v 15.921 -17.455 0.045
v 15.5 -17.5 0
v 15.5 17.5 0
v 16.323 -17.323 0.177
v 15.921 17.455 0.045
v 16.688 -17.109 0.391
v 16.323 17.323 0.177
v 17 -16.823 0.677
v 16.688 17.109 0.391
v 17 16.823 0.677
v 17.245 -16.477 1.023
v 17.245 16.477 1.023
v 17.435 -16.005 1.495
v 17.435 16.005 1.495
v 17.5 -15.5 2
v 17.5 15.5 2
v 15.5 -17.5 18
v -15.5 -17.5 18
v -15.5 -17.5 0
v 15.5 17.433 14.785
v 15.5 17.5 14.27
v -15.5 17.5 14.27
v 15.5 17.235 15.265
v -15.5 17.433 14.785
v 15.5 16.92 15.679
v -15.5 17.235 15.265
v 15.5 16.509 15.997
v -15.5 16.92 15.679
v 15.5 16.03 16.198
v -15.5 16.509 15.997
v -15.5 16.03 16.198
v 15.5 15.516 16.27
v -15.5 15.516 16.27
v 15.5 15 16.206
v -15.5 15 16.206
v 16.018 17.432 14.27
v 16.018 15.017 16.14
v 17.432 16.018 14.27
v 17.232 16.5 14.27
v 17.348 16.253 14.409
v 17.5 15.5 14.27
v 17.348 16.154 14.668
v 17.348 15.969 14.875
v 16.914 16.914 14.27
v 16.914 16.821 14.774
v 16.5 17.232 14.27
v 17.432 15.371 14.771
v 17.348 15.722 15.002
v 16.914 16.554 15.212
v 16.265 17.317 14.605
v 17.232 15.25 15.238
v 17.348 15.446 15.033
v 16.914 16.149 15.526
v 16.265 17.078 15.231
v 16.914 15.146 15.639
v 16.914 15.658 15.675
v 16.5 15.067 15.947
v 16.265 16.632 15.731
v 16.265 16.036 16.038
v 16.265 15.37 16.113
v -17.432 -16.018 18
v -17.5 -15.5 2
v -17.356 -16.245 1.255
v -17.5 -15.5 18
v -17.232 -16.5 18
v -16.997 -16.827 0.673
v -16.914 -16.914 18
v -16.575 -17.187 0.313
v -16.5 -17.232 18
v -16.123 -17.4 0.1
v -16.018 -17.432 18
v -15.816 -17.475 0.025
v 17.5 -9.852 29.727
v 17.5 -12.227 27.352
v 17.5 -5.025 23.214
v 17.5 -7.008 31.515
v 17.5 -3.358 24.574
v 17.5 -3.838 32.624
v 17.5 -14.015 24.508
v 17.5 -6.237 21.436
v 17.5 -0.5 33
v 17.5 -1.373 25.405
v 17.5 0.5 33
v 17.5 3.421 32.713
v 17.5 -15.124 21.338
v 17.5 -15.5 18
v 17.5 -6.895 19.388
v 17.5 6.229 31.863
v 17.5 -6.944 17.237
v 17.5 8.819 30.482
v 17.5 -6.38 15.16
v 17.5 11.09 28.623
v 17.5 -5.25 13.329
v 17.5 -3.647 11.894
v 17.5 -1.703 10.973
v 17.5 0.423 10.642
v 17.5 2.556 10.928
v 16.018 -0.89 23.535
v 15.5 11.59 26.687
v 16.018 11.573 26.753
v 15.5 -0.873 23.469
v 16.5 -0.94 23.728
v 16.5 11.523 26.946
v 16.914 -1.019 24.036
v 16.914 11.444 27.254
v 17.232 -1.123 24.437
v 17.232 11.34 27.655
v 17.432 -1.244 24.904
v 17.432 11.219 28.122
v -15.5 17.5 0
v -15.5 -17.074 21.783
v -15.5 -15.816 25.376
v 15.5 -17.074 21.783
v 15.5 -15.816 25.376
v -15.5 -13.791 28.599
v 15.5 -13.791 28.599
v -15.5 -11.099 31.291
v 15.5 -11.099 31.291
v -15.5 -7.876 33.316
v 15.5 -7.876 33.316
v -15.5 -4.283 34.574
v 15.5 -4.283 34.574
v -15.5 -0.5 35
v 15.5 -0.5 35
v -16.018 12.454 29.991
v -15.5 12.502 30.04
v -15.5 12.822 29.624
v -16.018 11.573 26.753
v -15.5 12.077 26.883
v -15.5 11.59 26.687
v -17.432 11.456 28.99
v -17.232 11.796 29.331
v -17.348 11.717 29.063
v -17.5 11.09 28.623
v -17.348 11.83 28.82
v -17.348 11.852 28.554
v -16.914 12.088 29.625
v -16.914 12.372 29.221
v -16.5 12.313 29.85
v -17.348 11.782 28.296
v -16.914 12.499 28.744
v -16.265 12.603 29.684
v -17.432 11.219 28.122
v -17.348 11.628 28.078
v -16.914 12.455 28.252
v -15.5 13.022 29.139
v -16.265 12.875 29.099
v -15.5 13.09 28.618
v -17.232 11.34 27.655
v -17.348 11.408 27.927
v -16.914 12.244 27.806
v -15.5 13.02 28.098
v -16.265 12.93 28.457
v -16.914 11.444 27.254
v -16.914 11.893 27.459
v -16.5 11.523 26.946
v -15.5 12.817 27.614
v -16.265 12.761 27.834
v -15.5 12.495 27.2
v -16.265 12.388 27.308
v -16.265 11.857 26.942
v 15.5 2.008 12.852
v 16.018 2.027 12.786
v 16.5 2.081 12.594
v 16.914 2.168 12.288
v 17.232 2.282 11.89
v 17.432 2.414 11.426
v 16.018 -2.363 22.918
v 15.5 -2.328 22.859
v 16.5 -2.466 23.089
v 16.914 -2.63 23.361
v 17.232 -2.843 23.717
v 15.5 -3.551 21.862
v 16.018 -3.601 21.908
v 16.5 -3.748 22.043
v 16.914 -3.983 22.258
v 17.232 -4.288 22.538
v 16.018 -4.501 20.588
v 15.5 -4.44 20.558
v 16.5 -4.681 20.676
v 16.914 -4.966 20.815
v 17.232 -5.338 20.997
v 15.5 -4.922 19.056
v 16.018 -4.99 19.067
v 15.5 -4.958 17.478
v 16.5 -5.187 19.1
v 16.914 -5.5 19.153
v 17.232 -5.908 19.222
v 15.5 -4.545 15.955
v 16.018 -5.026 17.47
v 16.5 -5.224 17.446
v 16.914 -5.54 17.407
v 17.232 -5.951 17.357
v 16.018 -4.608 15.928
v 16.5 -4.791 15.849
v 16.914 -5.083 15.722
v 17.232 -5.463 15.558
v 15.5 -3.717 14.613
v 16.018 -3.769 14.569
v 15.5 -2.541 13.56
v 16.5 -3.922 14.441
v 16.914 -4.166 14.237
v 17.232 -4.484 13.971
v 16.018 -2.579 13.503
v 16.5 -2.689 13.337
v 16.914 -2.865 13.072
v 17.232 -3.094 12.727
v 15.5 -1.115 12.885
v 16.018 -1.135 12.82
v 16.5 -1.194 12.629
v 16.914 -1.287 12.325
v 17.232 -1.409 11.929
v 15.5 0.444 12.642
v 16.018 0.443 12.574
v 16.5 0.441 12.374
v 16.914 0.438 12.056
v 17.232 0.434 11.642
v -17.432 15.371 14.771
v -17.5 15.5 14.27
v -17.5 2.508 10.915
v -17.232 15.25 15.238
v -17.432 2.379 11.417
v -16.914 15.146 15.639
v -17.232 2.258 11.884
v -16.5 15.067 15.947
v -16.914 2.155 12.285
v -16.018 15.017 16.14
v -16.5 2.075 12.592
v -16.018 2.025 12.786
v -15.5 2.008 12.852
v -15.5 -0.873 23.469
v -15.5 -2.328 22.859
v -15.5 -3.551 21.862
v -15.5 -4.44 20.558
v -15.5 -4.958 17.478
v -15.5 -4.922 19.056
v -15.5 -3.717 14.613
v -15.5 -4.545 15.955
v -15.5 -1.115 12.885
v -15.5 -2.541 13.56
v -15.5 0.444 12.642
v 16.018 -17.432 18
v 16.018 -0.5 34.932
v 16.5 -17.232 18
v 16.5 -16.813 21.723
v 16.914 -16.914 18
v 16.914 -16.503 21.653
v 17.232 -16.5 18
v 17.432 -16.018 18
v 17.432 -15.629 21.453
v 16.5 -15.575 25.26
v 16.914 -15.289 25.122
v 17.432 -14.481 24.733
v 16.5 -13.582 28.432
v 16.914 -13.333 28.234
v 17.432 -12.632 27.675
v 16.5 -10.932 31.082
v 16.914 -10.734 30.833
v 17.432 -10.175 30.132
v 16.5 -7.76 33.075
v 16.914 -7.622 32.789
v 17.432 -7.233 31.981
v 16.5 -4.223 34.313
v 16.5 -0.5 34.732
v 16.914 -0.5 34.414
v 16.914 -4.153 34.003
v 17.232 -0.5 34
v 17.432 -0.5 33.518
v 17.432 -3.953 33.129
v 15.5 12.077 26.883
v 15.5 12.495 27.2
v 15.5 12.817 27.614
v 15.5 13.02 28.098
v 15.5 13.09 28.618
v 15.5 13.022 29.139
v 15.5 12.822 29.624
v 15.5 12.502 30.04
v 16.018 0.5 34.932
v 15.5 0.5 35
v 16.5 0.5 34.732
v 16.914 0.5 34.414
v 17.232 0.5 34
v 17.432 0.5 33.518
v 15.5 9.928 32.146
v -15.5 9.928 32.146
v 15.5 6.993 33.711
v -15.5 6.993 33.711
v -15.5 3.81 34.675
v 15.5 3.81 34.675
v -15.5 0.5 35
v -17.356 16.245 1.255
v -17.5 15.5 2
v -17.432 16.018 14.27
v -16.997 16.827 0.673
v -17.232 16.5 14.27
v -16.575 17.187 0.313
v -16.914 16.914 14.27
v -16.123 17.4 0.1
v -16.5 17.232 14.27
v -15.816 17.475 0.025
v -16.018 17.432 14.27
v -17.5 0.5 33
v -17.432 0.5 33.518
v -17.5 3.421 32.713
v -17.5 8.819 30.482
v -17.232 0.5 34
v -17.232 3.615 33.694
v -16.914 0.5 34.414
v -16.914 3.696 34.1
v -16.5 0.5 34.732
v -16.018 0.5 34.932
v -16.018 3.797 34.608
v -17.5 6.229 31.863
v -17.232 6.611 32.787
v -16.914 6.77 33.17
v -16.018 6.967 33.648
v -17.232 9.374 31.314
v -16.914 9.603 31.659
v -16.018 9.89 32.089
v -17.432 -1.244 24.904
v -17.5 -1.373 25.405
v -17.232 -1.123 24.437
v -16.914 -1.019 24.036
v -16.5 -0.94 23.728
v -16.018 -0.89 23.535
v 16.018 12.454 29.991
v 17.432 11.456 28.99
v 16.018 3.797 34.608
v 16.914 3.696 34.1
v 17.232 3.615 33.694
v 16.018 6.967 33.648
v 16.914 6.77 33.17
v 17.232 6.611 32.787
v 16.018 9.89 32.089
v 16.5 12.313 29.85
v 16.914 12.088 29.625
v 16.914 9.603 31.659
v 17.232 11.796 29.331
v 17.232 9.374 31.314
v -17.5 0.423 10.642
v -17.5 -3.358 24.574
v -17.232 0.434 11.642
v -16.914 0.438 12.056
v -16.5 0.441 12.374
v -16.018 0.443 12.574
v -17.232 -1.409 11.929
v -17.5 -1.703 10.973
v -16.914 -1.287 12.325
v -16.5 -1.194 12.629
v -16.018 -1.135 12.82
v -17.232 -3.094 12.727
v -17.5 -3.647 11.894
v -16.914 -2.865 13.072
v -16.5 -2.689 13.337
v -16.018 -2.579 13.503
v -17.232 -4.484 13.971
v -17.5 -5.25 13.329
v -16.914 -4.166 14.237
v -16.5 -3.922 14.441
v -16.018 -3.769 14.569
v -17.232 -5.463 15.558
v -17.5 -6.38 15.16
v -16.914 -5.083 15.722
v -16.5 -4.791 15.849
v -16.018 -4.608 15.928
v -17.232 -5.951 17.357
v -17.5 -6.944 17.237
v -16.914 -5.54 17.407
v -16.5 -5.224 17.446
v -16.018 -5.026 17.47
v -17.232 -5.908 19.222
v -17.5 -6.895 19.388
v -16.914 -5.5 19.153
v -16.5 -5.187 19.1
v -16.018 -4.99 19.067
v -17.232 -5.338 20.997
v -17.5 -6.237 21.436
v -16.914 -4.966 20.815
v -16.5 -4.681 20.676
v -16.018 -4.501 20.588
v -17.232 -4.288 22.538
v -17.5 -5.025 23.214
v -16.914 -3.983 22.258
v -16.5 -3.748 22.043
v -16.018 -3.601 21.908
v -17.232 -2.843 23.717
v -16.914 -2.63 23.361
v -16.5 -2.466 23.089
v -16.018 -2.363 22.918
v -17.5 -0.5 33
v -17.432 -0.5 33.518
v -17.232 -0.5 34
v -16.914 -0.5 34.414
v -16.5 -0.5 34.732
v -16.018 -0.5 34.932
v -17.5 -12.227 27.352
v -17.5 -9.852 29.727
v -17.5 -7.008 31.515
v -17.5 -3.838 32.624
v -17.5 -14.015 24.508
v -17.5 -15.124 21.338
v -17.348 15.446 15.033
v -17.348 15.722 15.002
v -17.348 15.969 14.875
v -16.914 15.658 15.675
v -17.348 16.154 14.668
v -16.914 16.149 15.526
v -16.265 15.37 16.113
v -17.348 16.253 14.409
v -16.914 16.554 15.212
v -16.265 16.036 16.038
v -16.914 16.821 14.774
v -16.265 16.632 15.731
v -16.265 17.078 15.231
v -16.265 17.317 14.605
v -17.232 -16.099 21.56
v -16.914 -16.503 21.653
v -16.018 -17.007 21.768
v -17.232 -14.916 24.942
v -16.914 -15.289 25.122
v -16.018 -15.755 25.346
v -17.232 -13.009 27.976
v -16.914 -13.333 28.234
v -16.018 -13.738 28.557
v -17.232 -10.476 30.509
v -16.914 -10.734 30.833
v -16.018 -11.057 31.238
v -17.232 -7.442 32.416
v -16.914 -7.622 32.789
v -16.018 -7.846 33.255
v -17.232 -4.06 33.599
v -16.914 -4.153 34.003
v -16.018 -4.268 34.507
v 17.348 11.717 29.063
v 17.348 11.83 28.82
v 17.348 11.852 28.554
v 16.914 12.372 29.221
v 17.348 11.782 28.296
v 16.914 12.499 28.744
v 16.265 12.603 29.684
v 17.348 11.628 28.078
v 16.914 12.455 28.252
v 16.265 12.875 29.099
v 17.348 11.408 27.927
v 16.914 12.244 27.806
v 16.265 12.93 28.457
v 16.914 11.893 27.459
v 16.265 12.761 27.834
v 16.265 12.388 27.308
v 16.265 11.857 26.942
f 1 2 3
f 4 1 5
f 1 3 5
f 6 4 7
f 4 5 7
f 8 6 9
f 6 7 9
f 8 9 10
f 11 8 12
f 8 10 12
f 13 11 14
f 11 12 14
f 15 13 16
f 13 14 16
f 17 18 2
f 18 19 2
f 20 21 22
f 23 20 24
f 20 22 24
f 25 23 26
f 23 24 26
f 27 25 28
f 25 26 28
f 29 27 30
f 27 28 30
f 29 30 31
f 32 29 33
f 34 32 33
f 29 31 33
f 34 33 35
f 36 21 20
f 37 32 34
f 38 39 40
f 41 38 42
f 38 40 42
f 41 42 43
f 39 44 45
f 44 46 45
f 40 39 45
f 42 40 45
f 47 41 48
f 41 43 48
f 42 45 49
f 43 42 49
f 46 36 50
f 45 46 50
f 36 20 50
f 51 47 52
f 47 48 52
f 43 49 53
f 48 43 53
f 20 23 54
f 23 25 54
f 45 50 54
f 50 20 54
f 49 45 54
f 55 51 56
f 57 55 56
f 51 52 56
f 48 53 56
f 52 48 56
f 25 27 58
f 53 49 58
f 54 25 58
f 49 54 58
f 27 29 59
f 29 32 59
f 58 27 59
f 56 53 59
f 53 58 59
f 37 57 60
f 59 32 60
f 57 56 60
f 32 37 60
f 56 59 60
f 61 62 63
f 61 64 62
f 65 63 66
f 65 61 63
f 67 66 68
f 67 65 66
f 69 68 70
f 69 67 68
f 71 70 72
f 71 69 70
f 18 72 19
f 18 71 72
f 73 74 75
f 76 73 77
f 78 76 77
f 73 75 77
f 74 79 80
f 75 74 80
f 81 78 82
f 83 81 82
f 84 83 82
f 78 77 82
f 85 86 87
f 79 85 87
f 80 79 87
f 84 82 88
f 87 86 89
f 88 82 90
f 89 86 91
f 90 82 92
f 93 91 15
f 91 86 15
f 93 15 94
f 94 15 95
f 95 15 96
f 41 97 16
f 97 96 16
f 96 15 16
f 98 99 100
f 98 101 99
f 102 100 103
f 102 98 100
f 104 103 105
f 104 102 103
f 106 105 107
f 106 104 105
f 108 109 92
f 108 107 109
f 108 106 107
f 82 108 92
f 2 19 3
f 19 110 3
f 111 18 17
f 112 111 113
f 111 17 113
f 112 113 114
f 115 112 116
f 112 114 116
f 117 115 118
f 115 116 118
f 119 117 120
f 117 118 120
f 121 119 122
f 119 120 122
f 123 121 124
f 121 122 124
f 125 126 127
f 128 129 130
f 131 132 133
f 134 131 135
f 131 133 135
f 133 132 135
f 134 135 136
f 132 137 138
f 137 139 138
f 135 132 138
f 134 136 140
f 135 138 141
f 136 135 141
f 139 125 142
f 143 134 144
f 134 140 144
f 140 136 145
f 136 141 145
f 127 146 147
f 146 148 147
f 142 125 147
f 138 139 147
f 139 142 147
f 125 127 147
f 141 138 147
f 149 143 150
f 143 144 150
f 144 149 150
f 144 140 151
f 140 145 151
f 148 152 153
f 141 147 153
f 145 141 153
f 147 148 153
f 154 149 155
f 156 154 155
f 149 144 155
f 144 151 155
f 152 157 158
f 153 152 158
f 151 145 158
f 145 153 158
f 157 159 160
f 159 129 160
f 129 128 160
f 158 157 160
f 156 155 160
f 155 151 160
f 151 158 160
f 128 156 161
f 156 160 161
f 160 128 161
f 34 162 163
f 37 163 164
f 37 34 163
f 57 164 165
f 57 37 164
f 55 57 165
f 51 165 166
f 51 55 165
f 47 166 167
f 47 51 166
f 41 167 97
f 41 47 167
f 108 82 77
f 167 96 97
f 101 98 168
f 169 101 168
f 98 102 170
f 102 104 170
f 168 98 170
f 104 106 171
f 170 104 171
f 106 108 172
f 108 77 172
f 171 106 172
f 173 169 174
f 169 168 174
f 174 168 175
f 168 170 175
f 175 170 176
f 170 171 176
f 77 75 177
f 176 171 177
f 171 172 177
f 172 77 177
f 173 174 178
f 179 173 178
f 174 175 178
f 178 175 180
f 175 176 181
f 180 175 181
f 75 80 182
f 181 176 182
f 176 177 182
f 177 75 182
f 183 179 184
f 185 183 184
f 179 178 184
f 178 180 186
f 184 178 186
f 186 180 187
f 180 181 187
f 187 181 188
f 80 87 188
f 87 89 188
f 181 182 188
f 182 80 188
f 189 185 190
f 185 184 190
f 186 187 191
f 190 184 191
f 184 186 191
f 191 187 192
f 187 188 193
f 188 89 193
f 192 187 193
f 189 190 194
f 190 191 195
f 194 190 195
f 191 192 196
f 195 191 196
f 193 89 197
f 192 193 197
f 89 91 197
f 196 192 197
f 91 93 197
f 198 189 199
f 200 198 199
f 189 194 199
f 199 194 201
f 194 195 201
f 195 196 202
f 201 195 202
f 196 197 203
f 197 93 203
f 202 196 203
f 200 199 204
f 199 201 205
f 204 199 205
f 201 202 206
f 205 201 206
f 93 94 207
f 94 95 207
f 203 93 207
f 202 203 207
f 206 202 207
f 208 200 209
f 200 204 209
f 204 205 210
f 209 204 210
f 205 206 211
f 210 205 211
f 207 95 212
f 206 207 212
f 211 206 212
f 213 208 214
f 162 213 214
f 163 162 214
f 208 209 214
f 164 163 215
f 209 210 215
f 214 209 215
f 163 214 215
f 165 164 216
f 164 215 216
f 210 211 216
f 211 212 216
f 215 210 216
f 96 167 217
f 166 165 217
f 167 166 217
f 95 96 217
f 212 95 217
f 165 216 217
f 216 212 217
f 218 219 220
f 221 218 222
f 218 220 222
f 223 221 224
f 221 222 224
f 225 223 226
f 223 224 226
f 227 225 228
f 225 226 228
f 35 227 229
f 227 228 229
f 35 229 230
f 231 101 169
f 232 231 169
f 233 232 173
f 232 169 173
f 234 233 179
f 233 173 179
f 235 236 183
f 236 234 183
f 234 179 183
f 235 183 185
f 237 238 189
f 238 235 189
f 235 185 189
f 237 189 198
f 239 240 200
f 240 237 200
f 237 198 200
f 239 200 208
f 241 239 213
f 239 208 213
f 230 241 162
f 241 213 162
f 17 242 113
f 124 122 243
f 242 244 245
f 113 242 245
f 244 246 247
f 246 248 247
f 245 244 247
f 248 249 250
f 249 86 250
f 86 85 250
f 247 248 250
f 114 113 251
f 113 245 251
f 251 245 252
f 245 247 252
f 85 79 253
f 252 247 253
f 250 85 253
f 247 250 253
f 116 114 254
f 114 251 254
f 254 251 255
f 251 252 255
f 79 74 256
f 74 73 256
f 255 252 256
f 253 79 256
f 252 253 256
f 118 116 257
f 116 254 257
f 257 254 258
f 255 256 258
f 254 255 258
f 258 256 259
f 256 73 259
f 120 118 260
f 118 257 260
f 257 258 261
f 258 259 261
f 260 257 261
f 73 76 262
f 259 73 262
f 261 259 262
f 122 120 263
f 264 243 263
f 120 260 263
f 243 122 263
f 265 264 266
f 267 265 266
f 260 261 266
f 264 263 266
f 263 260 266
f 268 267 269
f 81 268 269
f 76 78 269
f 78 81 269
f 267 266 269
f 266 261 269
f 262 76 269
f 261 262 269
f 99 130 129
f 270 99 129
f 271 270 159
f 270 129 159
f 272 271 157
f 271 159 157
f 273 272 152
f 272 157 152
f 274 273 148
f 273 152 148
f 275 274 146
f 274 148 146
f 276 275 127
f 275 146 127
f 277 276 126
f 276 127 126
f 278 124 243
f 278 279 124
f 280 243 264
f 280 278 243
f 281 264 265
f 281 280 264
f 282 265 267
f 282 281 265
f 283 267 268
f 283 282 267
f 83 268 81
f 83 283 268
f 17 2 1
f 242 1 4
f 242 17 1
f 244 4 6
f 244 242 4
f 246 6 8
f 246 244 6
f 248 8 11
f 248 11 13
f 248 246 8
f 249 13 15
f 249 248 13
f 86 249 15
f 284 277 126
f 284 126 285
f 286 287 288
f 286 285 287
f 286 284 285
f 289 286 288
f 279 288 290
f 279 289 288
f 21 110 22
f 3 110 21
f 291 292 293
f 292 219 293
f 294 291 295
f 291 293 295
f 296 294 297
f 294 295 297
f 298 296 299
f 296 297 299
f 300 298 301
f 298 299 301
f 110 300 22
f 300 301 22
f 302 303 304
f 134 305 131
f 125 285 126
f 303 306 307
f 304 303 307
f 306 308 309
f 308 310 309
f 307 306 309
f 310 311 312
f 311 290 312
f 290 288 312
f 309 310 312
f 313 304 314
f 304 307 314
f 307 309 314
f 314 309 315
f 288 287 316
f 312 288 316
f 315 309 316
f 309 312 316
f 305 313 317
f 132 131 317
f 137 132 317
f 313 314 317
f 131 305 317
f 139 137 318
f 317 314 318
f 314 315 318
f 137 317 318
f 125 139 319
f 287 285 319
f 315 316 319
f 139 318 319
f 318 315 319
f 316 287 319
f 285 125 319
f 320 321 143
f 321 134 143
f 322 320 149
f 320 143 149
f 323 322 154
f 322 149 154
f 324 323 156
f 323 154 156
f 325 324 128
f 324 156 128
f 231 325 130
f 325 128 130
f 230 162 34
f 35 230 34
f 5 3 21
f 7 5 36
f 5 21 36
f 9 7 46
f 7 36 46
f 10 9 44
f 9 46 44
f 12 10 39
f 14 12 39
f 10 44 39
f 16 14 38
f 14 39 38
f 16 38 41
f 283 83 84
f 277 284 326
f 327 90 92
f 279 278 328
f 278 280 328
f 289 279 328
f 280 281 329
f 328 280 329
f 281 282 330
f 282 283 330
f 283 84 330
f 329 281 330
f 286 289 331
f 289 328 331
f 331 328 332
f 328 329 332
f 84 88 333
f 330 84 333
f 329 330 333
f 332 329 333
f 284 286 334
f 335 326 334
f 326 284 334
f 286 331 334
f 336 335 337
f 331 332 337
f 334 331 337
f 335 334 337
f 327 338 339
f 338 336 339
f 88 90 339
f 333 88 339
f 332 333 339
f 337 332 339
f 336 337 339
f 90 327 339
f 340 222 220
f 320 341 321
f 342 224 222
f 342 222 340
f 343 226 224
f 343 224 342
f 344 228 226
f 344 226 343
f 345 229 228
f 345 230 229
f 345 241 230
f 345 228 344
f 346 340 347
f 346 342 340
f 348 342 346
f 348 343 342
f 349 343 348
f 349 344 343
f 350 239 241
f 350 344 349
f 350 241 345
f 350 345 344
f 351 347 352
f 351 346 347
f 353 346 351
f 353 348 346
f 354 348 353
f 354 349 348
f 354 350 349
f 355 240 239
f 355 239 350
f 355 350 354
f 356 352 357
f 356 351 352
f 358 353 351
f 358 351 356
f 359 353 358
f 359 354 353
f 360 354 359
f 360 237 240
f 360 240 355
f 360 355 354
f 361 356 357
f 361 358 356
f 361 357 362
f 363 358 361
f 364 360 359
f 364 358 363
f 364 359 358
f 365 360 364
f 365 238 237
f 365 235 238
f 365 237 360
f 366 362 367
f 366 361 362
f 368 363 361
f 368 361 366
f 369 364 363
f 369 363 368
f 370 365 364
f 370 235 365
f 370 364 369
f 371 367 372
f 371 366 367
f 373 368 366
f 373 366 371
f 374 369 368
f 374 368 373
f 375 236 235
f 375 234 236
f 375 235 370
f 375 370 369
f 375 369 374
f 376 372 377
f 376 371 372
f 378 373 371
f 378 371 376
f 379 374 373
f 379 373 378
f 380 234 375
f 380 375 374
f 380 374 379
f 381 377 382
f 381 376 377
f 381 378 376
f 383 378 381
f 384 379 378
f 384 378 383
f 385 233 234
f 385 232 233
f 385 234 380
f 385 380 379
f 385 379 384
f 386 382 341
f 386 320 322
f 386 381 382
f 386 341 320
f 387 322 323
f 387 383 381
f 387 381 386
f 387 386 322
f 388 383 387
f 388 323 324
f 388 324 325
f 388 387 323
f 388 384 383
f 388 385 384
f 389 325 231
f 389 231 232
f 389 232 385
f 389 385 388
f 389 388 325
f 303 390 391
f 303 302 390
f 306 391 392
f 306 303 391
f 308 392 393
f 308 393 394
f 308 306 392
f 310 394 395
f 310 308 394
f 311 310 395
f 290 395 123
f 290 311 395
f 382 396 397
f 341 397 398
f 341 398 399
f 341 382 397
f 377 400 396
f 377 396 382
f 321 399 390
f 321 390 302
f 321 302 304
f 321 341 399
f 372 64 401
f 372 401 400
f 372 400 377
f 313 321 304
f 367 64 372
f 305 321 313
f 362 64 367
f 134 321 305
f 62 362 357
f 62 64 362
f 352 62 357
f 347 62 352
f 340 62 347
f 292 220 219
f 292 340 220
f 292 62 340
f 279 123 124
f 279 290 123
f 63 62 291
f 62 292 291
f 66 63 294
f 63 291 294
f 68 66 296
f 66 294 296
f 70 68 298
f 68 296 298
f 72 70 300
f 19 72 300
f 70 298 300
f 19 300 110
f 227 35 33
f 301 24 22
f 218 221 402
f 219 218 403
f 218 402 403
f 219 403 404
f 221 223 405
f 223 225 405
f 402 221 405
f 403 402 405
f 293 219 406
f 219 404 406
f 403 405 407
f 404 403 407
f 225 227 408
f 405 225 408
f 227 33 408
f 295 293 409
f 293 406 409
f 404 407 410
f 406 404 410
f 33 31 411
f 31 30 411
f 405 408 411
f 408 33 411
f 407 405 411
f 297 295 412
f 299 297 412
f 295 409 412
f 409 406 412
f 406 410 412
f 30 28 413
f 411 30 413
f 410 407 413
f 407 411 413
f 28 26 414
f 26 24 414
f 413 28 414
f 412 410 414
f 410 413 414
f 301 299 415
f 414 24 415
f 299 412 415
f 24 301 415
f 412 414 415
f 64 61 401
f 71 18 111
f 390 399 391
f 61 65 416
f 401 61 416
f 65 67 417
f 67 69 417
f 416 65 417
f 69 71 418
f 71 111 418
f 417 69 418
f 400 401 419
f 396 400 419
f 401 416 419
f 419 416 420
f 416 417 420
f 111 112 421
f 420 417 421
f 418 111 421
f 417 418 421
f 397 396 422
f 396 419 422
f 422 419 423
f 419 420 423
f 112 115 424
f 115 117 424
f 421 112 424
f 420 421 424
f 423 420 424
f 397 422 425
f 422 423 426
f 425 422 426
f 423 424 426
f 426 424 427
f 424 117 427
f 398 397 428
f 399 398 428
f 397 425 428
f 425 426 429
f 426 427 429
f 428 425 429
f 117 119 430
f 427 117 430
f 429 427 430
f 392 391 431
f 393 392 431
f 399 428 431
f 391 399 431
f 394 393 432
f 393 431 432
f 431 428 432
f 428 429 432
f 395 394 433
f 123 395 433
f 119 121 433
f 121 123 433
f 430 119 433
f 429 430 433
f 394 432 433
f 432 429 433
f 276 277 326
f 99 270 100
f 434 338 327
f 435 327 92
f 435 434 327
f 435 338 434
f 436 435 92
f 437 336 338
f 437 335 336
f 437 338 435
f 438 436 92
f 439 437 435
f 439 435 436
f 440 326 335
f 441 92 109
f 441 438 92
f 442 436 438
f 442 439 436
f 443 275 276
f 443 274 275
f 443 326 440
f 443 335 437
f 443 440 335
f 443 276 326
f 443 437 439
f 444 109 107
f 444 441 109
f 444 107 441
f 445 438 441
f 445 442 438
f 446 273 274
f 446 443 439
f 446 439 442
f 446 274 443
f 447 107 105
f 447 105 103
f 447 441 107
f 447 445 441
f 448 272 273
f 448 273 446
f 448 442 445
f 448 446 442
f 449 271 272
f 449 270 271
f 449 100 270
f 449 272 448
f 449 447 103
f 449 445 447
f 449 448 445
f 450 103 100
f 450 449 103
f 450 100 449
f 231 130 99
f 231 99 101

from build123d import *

# Parameters (mm, degrees)
F0_W     = 35
F0_H     = 35
F1_DEPTH = 35
F2_R     = 17
F5_DEPTH = 35.001
F6_R     = 2


with BuildPart() as f1:
    # F0 (on Top) → F1 (new body)
    with BuildSketch(Plane.XY):
        Rectangle(F0_W, F0_H)
    extrude(amount=F1_DEPTH)

    # F2
    f2_edges = [f1.edges().sort_by_distance(p)[0] for p in [
        (0, -17.5, 35),
        (0, 17.5, 35),
    ]]
    fillet(f2_edges, radius=F2_R)

    # F4 (on face) → F5 (cut, through all)
    with BuildSketch(Plane.YZ.offset(17.5)):
        with BuildLine():
            ThreePointArc((17.5, 18), (16.7637891964, 22.9486524402), (14.6189222384, 27.4686870699))
            Line((14.6189222384, 27.4686870699), (-0.8730111465, 23.4686870699))
            ThreePointArc((-0.8730111465, 23.4686870699), (-4.8066349175, 16.7018804151), (2.0080666152, 12.8518270003))
            Line((2.0080666152, 12.8518270003), (17.5, 16.8518270003))
            Line((17.5, 16.8518270003), (17.5, 18))
        make_face()
    extrude(amount=-F5_DEPTH, mode=Mode.SUBTRACT)

    # F6
    f6_edges = [f1.edges().sort_by_distance(p)[0] for p in [
        (17.5, -17.5, 9),
        (17.5, 0, 0),
        (17.5, 17.5, 8.425914),
        (17.5, 9.754033, 14.851827),
        (17.5, -4.806635, 16.70188),
        (17.5, 6.872956, 25.468687),
        (17.5, 8.50101, 32.999461),
        (17.5, 0, 35),
        (17.5, -12.520815, 30.020815),
        (-17.5, 0, 0),
        (-17.5, -17.5, 9),
        (-17.5, -12.520815, 30.020815),
        (-17.5, 0, 35),
        (-17.5, 8.50101, 32.999461),
        (-17.5, 6.872956, 25.468687),
        (-17.5, -4.806635, 16.70188),
        (-17.5, 9.754033, 14.851827),
        (-17.5, 17.5, 8.425914),
        (0, 17.5, 16.851827),
        (0, 14.618922, 27.468687),
    ]]
    fillet(f6_edges, radius=F6_R)


solid = f1.part
